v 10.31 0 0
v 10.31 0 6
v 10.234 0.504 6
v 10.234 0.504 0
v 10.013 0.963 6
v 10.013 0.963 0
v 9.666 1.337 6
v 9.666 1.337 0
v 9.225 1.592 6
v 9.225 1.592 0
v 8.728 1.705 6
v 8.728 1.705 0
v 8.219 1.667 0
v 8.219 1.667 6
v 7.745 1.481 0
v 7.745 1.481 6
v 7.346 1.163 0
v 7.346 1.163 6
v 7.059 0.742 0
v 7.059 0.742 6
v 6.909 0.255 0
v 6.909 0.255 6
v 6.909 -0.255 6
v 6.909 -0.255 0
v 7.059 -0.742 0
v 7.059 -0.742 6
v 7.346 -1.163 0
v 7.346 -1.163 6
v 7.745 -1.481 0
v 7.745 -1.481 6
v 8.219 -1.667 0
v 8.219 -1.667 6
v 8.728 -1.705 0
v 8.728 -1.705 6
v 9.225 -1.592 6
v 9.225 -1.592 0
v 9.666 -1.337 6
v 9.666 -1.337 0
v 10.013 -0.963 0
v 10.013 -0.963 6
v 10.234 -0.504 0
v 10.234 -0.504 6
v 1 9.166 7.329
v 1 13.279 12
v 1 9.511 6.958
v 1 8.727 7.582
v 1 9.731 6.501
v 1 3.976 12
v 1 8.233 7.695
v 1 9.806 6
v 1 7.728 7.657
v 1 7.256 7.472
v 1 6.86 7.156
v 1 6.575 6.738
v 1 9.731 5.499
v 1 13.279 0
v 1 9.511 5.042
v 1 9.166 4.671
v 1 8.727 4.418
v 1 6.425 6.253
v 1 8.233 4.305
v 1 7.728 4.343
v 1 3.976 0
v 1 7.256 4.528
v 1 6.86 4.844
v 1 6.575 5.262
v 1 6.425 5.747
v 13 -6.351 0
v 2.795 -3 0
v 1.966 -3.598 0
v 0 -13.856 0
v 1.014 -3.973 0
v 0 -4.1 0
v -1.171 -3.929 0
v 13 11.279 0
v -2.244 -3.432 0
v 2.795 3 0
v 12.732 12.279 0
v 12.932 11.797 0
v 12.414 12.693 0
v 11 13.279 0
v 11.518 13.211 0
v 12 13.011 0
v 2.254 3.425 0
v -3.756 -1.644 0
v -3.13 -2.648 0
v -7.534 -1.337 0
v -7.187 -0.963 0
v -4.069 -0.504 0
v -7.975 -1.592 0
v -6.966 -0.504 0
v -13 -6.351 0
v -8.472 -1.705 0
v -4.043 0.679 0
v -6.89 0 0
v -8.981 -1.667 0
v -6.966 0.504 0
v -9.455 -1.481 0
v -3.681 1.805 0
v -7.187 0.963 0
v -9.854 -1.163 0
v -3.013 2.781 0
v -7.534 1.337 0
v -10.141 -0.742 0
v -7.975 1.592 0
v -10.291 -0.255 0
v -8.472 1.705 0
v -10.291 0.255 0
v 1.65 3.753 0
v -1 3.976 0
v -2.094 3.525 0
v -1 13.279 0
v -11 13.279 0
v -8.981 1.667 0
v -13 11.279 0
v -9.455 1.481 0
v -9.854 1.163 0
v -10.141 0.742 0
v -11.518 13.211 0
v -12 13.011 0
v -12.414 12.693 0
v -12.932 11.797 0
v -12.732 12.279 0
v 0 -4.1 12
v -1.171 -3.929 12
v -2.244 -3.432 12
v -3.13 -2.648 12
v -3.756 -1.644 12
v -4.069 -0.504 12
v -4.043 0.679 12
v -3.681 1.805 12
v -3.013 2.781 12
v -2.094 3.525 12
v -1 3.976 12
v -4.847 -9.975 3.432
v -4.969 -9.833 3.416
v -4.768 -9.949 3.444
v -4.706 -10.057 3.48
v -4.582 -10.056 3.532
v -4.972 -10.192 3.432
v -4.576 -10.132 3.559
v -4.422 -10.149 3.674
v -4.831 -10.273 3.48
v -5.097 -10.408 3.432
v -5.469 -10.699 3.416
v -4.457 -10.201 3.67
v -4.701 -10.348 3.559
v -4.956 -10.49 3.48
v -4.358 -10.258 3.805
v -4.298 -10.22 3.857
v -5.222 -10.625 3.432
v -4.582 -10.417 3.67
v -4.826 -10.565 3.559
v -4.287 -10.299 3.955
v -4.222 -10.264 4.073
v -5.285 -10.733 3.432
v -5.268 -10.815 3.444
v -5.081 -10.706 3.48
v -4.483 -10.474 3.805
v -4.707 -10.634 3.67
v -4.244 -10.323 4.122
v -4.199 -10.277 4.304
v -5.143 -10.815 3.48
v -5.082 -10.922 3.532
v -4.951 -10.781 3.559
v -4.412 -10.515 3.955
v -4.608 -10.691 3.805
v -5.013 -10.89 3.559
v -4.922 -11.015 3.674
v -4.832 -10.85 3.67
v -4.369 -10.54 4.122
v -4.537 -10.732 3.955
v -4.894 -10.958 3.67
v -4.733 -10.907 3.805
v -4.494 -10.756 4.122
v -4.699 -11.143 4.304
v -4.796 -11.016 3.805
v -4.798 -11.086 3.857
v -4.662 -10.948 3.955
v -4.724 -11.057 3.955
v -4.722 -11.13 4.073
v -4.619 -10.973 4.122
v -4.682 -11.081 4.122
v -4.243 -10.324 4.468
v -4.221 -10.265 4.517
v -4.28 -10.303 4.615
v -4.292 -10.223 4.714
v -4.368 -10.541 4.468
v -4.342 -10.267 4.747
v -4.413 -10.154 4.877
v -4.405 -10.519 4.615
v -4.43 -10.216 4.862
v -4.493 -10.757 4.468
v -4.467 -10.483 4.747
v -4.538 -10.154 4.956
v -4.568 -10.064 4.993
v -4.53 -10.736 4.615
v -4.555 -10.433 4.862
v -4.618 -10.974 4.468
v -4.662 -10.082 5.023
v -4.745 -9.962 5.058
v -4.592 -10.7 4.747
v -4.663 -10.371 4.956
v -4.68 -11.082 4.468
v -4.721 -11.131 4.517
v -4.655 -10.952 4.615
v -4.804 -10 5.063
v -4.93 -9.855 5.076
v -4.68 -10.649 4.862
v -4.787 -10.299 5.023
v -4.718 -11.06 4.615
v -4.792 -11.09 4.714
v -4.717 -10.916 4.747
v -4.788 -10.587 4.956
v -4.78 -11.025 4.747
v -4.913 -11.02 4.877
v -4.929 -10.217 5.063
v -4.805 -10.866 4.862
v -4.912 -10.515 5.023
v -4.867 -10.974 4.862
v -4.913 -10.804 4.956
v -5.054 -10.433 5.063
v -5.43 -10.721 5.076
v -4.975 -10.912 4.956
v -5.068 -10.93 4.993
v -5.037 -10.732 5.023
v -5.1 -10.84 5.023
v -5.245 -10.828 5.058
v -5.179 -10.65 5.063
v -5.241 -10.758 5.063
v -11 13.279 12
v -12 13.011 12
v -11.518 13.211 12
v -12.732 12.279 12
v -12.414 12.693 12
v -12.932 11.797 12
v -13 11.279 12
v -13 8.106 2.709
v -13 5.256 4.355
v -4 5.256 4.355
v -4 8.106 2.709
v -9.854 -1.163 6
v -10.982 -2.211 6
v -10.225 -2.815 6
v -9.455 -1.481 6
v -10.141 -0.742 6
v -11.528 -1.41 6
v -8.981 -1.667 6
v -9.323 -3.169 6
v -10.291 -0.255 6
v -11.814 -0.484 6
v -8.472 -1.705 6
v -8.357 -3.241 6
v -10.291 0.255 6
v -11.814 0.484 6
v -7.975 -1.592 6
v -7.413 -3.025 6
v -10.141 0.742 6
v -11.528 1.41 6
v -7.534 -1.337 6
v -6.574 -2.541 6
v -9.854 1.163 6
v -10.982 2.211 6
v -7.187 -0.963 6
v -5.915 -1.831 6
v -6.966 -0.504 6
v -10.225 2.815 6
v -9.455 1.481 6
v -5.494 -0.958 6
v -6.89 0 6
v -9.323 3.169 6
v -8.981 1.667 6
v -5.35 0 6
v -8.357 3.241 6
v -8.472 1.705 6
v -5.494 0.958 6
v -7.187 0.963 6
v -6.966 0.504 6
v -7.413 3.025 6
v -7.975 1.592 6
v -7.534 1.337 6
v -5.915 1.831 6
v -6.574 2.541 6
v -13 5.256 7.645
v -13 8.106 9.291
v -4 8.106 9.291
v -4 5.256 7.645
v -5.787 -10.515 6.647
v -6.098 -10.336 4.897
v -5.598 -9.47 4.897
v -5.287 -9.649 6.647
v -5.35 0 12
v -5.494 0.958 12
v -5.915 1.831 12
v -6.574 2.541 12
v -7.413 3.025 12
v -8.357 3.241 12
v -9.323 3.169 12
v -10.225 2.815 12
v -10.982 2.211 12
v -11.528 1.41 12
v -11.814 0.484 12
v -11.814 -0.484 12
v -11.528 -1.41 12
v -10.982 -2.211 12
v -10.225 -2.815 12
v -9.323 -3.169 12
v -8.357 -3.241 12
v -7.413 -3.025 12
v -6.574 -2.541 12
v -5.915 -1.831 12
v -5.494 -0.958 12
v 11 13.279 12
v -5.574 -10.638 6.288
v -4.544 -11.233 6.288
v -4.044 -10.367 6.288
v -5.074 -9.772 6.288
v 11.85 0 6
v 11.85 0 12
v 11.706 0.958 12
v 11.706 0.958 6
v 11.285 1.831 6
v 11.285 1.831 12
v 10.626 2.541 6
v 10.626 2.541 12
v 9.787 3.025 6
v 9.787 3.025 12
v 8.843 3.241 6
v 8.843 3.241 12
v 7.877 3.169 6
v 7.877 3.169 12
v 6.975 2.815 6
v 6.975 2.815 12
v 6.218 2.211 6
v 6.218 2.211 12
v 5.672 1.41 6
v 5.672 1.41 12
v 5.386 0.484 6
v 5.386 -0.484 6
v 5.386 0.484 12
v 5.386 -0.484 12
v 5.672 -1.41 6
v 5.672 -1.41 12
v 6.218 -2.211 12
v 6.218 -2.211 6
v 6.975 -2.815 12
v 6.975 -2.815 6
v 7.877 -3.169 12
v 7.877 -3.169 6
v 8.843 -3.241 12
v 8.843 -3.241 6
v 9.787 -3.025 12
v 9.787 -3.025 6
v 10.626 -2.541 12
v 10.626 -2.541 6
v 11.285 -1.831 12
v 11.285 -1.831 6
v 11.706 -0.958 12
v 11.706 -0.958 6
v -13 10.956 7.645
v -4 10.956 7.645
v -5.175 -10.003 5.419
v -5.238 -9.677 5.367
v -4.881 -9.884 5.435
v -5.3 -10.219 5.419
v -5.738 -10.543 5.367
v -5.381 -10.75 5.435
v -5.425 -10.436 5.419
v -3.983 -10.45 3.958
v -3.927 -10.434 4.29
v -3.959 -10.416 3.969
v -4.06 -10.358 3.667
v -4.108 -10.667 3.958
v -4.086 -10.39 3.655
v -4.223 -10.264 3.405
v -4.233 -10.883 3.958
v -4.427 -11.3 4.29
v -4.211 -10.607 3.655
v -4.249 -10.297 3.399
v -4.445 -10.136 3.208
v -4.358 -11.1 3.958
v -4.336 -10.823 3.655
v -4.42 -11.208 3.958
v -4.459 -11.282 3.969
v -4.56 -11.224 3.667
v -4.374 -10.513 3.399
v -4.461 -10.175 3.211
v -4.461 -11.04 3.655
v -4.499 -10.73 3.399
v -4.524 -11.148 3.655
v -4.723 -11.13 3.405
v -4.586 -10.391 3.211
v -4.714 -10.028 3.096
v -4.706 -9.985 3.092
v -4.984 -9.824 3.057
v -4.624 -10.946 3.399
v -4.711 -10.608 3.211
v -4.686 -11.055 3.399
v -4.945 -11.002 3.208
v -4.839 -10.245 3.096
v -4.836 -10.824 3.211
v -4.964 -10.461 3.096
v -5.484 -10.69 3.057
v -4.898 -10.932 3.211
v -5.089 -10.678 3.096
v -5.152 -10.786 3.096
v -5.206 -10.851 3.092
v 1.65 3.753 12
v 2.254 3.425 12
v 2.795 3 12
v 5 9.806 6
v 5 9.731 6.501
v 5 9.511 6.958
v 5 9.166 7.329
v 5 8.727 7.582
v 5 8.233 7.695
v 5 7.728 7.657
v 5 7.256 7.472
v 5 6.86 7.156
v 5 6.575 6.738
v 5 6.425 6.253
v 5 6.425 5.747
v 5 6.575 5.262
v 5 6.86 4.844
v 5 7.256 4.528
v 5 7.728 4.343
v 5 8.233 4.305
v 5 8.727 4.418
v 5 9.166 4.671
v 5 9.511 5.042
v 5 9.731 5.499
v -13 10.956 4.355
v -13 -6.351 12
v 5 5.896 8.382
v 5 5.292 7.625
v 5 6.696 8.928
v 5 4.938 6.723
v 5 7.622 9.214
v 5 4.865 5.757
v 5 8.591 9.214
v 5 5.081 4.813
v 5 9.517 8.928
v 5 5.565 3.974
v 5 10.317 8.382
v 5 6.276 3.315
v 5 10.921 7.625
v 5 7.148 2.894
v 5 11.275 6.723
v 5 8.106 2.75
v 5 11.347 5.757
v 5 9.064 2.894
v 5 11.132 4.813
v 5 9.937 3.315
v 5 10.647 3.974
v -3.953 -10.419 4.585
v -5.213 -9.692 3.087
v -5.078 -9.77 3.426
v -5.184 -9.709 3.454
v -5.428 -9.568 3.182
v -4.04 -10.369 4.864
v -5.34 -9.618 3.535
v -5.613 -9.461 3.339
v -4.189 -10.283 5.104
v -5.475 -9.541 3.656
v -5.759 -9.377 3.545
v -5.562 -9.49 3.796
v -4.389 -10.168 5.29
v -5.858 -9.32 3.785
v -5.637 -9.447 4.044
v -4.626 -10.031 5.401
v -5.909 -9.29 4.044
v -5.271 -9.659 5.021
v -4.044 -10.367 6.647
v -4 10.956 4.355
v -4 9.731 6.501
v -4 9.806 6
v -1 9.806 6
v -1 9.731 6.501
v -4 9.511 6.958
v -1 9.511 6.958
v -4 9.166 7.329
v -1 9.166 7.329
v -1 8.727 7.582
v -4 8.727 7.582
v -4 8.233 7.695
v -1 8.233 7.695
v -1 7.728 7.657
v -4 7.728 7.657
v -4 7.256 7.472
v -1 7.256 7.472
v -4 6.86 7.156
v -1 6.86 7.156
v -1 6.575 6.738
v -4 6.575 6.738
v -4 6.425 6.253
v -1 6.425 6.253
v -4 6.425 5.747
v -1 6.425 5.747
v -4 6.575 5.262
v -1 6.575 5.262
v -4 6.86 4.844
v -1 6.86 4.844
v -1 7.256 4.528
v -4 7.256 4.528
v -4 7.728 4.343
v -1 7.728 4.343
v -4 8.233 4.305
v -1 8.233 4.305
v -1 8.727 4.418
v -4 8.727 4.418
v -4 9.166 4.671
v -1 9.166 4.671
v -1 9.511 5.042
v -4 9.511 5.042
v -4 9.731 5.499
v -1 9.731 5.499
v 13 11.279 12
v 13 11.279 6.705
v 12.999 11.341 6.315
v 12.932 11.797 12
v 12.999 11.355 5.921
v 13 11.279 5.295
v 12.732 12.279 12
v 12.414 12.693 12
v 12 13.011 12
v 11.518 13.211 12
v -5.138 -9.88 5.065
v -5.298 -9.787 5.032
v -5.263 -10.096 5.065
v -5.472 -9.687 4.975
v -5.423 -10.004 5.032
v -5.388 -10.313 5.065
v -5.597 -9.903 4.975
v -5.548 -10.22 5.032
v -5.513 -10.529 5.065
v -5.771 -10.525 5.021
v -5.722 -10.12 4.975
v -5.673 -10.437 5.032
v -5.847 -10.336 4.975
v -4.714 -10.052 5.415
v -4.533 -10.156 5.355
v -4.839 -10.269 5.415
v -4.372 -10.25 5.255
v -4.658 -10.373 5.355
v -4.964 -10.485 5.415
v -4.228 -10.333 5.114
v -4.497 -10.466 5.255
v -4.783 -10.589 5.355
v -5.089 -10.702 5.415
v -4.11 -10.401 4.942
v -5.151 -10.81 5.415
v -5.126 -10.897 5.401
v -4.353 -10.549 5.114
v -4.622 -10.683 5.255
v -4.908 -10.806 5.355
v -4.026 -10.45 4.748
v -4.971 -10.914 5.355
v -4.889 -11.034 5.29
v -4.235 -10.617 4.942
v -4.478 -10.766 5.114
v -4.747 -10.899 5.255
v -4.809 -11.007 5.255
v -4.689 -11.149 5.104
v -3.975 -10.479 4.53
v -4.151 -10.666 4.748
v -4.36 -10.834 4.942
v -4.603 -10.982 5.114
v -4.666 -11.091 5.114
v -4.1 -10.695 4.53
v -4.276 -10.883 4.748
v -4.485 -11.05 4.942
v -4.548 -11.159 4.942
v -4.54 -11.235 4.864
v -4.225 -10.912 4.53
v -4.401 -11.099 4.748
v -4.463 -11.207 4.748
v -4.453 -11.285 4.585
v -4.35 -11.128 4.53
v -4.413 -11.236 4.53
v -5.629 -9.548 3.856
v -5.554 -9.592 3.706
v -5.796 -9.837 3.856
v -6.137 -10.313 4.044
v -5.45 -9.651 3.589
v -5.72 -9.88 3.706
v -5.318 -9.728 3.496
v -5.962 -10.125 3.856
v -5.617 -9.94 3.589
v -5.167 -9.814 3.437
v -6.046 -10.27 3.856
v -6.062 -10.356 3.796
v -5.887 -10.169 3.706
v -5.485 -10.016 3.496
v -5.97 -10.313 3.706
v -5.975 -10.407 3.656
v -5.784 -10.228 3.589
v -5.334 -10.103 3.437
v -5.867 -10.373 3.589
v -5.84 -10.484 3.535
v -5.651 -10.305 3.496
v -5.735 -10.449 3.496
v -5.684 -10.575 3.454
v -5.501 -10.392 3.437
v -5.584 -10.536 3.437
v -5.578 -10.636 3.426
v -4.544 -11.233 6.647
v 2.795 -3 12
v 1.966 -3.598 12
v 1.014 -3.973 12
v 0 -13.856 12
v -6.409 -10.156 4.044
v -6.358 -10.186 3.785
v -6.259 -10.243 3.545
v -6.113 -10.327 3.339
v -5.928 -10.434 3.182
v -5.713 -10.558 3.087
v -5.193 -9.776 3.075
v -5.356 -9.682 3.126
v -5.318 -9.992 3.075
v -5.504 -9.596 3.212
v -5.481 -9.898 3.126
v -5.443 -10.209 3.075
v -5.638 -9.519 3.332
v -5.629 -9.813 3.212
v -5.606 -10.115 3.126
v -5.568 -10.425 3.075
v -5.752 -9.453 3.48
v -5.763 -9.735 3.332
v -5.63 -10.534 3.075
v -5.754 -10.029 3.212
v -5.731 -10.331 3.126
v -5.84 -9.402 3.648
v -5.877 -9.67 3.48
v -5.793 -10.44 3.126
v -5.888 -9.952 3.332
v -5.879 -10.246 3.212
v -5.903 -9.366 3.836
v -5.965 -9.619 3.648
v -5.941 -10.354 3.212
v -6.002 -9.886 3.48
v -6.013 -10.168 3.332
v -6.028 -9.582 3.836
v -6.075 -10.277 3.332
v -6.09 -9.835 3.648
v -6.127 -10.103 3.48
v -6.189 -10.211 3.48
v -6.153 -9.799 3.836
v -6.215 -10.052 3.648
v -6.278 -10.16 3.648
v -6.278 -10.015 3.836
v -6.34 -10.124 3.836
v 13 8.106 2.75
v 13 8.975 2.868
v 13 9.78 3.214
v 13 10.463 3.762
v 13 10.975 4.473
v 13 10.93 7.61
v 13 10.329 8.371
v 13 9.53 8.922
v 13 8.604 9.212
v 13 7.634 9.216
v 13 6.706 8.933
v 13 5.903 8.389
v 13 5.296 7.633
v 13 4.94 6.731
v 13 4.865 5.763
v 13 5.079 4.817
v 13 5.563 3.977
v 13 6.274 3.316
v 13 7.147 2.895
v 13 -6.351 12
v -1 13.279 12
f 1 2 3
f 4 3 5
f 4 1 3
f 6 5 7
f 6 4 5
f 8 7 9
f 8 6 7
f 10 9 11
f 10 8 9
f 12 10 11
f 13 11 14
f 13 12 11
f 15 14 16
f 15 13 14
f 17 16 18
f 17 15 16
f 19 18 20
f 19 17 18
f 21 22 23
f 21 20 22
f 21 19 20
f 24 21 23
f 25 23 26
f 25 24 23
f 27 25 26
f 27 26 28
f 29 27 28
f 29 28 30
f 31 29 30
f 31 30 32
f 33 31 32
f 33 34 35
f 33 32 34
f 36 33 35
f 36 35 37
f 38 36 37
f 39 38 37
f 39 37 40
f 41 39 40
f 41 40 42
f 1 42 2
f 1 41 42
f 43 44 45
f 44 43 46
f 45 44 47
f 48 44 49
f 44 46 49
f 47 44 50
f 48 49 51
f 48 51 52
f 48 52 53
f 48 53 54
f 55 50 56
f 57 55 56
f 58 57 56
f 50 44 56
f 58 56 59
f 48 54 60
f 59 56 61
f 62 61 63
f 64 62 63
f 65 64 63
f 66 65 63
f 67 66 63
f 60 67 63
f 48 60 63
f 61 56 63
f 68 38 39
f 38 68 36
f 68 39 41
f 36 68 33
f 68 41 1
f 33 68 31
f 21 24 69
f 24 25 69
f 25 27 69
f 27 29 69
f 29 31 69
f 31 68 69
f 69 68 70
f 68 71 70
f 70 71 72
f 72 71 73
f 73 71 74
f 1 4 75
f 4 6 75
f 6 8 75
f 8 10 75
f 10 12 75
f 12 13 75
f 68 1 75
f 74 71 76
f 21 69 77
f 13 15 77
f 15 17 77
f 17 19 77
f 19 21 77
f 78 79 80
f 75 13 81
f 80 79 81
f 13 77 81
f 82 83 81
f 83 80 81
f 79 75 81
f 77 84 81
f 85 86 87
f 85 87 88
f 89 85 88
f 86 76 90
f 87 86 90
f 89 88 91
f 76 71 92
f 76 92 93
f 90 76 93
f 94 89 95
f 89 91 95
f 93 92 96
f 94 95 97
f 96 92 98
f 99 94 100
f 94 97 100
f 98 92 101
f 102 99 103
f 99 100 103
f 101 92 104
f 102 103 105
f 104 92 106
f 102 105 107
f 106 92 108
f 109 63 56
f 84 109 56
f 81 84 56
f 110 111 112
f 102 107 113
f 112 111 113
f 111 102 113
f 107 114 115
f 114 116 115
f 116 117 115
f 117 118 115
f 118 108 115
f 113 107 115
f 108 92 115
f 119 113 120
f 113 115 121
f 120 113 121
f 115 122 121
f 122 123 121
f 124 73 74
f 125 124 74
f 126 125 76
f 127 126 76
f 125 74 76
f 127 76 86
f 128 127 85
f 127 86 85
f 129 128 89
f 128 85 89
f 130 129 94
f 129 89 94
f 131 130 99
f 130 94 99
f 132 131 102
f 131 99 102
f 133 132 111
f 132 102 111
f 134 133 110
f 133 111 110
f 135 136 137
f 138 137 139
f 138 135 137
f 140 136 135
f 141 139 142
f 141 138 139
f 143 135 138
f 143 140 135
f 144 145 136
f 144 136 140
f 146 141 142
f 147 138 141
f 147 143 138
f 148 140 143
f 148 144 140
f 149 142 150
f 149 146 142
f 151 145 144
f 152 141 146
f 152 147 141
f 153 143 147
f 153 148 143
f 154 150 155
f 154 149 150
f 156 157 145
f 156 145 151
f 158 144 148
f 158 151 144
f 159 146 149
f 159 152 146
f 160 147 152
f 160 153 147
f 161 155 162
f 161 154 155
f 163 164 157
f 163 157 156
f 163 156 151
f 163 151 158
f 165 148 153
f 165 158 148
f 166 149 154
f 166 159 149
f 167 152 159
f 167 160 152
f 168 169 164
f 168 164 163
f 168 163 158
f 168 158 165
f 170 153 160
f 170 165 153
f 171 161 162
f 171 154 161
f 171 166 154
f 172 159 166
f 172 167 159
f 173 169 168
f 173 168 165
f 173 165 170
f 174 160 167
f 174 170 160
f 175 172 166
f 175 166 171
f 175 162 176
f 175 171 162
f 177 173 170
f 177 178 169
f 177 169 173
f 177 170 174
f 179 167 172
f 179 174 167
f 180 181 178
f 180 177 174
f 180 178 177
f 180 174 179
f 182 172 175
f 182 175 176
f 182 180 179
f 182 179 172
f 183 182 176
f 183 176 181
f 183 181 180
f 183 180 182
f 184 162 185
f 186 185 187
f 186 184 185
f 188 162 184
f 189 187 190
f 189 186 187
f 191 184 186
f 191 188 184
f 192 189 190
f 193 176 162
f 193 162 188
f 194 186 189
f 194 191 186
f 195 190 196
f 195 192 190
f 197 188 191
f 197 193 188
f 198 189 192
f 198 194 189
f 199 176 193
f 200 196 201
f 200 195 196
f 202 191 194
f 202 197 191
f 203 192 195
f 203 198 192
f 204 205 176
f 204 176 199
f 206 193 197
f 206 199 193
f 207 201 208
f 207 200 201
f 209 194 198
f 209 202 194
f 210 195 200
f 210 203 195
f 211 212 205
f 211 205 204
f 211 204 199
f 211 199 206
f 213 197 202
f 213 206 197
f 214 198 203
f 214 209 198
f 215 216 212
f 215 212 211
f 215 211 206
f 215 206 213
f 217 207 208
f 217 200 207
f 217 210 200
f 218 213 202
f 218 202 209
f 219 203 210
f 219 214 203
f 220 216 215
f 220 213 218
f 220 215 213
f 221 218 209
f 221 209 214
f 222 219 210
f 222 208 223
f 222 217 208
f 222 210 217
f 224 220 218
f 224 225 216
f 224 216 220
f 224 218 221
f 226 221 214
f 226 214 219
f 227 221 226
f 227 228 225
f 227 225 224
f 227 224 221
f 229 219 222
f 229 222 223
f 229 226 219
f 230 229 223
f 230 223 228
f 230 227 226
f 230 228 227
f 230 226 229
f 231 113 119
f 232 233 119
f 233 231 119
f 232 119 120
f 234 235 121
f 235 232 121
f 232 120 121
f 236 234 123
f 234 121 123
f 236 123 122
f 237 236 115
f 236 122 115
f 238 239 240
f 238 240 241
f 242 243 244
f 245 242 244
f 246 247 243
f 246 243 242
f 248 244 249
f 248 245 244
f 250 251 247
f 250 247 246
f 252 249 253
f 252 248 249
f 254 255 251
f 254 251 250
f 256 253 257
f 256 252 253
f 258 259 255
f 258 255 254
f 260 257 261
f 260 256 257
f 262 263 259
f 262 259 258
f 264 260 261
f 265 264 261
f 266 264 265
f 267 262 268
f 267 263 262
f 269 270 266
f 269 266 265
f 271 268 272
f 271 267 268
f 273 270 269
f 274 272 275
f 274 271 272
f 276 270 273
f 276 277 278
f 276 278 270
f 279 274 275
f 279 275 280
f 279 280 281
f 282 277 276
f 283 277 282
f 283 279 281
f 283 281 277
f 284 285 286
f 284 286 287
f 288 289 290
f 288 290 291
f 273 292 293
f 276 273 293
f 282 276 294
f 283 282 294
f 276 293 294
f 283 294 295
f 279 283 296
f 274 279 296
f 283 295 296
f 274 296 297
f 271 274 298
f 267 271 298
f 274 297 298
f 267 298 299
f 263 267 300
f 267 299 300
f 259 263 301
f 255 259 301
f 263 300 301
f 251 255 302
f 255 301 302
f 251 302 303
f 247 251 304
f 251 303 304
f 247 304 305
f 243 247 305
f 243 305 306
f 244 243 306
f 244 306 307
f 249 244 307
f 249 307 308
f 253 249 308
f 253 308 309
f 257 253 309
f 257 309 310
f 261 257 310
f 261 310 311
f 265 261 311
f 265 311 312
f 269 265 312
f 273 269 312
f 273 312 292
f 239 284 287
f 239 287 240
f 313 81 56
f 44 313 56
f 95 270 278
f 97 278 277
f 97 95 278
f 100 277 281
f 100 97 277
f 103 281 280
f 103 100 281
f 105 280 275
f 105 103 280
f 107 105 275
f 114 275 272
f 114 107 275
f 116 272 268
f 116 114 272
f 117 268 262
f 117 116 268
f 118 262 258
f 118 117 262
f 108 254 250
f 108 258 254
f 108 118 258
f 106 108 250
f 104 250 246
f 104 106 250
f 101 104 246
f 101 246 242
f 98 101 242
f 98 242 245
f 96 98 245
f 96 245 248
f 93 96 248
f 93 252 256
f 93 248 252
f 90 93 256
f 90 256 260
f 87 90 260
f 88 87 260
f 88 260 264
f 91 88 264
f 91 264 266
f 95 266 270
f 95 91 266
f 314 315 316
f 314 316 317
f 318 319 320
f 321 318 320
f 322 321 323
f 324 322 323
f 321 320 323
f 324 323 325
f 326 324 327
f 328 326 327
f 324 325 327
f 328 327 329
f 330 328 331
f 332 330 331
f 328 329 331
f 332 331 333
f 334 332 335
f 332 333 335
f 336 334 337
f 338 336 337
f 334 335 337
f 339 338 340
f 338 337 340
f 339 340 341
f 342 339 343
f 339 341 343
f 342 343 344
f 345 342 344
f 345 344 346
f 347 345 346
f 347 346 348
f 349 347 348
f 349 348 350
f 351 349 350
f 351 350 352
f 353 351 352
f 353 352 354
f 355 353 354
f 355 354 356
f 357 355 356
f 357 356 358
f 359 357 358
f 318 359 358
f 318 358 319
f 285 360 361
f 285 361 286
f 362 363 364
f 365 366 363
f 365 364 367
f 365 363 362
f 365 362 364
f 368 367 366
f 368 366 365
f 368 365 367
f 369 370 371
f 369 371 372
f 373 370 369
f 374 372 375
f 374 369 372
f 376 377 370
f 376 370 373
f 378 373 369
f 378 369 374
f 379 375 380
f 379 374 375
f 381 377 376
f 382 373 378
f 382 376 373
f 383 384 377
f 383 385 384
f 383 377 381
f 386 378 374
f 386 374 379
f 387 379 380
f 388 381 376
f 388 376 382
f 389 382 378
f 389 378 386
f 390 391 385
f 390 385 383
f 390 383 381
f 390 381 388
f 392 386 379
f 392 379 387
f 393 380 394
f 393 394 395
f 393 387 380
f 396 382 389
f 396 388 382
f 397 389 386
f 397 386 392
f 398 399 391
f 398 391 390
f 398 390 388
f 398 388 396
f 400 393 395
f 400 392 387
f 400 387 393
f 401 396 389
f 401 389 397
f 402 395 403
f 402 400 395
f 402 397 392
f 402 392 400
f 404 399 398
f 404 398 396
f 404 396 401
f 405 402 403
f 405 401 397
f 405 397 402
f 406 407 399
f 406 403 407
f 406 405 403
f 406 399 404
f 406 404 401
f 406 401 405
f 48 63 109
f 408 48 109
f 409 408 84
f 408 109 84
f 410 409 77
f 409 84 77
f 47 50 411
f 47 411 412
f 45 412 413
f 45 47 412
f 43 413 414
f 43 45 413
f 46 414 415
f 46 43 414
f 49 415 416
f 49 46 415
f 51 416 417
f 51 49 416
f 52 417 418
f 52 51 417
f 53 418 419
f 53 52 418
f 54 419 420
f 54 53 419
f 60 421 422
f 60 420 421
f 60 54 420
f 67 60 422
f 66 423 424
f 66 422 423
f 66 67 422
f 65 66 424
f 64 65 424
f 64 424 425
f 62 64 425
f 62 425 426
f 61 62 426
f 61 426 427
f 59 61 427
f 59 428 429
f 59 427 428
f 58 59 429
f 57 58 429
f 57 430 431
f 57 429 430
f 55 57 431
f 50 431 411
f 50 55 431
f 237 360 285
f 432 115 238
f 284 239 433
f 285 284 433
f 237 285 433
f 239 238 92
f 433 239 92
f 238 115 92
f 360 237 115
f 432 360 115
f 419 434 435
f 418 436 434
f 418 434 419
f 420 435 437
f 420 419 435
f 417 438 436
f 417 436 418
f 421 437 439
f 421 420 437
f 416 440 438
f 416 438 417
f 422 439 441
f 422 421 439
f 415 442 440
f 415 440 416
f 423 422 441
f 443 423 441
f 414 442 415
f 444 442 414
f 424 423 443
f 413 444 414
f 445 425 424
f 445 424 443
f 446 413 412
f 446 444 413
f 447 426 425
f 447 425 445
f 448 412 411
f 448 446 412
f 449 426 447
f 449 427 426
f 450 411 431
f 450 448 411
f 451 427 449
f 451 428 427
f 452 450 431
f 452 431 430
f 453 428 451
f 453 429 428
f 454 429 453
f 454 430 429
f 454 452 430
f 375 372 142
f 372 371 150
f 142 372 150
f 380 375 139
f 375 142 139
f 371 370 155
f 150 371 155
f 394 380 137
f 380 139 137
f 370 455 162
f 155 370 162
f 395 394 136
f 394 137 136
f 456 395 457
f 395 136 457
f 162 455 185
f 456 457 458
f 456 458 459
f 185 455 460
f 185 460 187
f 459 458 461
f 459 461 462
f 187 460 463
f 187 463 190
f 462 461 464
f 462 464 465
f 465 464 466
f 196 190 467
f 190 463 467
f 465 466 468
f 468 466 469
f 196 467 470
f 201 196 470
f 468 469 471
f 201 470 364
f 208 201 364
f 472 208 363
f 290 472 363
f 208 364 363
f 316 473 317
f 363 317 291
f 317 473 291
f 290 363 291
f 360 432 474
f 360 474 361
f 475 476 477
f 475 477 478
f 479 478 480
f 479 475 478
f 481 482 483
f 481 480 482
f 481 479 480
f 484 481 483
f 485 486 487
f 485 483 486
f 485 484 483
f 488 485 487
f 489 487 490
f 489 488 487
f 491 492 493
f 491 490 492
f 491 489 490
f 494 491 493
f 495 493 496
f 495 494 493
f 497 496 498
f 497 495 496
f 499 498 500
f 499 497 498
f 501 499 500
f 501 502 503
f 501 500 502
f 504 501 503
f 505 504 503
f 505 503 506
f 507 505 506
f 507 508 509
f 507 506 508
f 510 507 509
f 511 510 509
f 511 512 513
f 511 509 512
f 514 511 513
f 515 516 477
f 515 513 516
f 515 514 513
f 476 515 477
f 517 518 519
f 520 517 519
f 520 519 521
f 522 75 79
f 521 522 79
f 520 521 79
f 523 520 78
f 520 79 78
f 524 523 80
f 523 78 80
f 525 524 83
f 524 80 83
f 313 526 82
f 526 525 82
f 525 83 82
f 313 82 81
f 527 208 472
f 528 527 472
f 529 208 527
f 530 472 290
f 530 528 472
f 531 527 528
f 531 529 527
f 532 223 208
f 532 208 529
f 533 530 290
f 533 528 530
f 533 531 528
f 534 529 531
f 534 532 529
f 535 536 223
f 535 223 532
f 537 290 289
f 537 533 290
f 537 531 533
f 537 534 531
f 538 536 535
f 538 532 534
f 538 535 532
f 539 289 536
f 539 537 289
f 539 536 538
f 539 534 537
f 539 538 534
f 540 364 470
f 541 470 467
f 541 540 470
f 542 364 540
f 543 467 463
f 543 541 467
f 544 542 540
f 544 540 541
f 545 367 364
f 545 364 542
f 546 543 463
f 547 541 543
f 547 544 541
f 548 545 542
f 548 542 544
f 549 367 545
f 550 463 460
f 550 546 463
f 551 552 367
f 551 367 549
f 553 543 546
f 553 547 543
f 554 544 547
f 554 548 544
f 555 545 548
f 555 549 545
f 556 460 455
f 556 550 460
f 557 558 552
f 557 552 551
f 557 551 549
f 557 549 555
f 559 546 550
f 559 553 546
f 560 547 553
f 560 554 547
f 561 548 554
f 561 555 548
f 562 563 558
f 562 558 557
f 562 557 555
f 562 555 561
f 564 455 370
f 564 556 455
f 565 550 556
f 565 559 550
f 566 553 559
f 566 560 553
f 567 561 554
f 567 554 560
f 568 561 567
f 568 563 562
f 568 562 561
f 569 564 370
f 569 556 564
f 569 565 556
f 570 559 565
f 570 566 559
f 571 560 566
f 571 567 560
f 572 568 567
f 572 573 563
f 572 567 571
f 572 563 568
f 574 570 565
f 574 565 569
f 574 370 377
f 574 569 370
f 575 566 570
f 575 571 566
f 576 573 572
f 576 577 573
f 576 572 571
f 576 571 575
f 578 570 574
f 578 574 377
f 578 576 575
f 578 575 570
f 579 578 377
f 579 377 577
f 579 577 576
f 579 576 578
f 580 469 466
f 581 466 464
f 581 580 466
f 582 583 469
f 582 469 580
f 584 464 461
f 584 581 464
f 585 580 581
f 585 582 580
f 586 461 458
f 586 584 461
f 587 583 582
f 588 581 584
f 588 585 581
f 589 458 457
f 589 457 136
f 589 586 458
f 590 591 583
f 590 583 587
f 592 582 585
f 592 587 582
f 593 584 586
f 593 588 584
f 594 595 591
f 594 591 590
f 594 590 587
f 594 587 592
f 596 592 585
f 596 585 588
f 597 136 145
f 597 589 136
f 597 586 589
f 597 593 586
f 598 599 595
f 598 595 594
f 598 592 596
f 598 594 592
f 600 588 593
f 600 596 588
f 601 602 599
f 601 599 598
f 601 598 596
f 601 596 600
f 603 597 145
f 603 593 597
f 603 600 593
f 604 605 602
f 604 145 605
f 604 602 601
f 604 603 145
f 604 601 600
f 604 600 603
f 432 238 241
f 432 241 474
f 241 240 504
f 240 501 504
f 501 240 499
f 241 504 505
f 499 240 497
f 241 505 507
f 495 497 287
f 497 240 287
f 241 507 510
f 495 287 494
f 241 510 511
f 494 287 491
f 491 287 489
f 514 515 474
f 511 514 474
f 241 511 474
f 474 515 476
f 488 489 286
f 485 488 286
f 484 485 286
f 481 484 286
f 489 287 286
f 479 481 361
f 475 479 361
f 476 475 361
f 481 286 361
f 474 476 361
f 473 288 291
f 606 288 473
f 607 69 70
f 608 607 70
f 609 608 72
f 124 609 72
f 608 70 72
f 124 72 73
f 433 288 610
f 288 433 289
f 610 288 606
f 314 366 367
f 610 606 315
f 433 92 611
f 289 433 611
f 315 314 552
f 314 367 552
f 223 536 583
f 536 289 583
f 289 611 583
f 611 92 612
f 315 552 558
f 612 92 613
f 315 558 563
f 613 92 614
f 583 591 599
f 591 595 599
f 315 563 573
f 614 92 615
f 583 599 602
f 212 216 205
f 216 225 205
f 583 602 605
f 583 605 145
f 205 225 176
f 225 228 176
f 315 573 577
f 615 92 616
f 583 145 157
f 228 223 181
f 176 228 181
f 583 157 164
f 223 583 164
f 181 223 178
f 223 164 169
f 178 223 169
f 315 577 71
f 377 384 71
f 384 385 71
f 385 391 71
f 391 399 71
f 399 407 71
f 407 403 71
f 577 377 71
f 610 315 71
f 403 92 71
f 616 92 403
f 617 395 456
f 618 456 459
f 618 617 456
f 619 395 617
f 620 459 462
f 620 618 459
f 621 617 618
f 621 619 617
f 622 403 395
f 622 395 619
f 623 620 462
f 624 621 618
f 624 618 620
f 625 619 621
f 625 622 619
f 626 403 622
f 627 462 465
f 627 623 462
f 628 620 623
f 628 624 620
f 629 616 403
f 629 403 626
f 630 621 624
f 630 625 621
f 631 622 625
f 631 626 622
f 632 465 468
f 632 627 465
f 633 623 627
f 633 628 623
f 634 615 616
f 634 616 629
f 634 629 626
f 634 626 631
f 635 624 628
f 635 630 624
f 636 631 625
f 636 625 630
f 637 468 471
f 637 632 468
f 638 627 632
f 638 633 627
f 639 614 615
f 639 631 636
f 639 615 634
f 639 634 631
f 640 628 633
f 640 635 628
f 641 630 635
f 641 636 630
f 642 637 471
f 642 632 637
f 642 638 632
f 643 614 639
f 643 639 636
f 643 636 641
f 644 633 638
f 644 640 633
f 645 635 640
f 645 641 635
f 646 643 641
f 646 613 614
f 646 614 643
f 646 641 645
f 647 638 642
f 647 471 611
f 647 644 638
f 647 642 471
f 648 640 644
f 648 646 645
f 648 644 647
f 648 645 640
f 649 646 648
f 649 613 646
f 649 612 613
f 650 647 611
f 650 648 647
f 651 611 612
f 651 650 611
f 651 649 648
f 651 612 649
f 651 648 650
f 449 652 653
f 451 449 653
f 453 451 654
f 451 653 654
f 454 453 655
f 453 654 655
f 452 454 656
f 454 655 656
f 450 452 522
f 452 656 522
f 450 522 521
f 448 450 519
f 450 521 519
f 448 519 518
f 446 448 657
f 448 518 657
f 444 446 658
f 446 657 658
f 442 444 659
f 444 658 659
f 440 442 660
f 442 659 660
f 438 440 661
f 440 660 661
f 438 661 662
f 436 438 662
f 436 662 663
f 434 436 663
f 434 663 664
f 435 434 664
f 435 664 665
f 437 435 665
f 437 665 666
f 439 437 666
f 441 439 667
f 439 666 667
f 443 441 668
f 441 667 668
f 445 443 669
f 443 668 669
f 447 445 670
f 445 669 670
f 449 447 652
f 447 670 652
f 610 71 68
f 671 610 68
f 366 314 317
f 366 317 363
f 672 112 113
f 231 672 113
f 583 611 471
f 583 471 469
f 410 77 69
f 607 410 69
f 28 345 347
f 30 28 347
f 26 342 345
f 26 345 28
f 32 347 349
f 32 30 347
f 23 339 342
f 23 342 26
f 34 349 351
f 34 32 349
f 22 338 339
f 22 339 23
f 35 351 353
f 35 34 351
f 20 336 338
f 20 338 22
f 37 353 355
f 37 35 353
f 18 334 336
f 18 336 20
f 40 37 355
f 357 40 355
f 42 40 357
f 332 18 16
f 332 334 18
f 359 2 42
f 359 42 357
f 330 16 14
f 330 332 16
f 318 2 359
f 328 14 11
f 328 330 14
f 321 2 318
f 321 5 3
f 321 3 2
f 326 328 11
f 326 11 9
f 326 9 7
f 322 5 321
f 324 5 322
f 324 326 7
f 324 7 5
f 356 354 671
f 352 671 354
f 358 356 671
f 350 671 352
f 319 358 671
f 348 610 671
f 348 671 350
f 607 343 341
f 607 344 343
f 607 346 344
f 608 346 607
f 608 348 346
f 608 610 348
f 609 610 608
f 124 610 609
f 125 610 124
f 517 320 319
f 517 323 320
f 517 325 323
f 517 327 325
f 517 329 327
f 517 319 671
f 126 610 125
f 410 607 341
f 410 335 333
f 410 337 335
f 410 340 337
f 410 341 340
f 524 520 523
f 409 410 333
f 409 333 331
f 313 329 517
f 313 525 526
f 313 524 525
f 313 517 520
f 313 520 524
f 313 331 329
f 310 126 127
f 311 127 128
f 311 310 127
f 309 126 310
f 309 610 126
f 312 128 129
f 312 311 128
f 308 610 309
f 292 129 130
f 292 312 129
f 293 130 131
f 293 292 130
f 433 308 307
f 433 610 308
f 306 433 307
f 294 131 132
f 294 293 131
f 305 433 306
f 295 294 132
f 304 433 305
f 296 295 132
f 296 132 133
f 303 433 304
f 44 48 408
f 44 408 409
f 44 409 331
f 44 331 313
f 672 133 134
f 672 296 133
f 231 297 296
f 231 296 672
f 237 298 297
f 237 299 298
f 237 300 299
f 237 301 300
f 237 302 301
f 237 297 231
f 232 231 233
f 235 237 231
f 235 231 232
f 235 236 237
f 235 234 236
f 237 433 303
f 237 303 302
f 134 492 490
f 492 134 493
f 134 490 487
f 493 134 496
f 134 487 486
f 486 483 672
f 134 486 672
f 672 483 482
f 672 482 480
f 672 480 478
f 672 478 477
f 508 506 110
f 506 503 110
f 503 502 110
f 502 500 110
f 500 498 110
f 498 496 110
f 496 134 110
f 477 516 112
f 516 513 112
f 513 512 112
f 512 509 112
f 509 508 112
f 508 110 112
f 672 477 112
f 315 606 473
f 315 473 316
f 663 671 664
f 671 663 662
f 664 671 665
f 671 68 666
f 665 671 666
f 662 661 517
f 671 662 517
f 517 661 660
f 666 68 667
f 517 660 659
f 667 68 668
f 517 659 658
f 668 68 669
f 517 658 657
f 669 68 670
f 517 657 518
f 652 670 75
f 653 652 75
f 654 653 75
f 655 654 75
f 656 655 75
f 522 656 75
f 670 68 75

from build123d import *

# Parameters (mm, degrees)
BOSS_EXTRUDE1_DEPTH            = 12
SKETCH41_R                     = 1.71
CUT_EXTRUDE7_DEPTH             = 18
CBORE_FOR_M3_SHCS1_D           = 3.4
CBORE_FOR_M3_SHCS1_CBORE_D     = 6.5
CBORE_FOR_M3_SHCS1_CBORE_DEPTH = 3
CBORE_FOR_M3_SHCS2_D           = 3.4
CBORE_FOR_M3_SHCS2_CBORE_D     = 6.5
CBORE_FOR_M3_SHCS2_CBORE_DEPTH = 3
CUT_EXTRUDE10_DEPTH            = 15
CUT_EXTRUDE10_DEPTH_BACK       = 15
SKETCH52_R                     = 1.7
SKETCH58_R                     = 3.25
CUT_EXTRUDE11_DEPTH            = 8
CUT_EXTRUDE12_DEPTH            = 4
CUT_EXTRUDE12_DEPTH_BACK       = 6
FILLET1_R                      = 2
SKETCH61_R                     = 3.25
CUT_EXTRUDE13_DEPTH            = 6
CUT_EXTRUDE14_DEPTH            = 1


with BuildPart() as part:
    # Sketch1 → Boss-Extrude1 (new body)
    with BuildSketch(Plane(origin=(0, 0, 0), x_dir=(0, 1, 0), z_dir=(0, 0, 1))):
        with BuildLine():
            Line((-6.350852961, -13), (13.279056191, -13))
            Line((13.279056191, -13), (13.279056191, -1))
            Line((13.279056191, -1), (3.97617907, -1))
            ThreePointArc((3.97617907, -1), (3.601659304, -1.959094244), (3, -2.794637722))
            Line((3, -2.794637722), (-3, -2.794637722))
            ThreePointArc((-3, -2.794637722), (-3.815101571, -1.501665742), (-4.1, 0))
            ThreePointArc((-4.1, 0), (-0.503818326, 4.06892702), (3.97617907, 1))
            Line((3.97617907, 1), (13.279056191, 1))
            Line((13.279056191, 1), (13.279056191, 13))
            Line((13.279056191, 13), (-6.350852961, 13))
            Line((-6.350852961, 13), (-13.856406461, 0))
            Line((-13.856406461, 0), (-6.350852961, -13))
        make_face()
    extrude(amount=BOSS_EXTRUDE1_DEPTH)

    # Sketch41 → Cut-Extrude7 (cut)
    with BuildSketch(Plane(origin=(0, 0, 0), x_dir=(0, 1, 0), z_dir=(0, 0, 1))):
        with Locations(Location((0, 8.6, 0), (0, 0, 270))):
            Circle(SKETCH41_R)
        with Locations(Location((0, -8.6, 0), (0, 0, 270))):
            Circle(SKETCH41_R)
    extrude(amount=CUT_EXTRUDE7_DEPTH, mode=Mode.SUBTRACT)

    # CBORE for M3 SHCS1 (through all)
    with Locations(Plane(origin=(-8.6, 0, 12), x_dir=(1, 0, 0), z_dir=(0, 0, 1))):
        with Locations((0, 0)):
            CounterBoreHole(CBORE_FOR_M3_SHCS1_D / 2, CBORE_FOR_M3_SHCS1_CBORE_D / 2, CBORE_FOR_M3_SHCS1_CBORE_DEPTH)

    # CBORE for M3 SHCS2 (through all)
    with Locations(Plane(origin=(8.6, 0, 12), x_dir=(1, 0, 0), z_dir=(0, 0, 1))):
        with Locations((0, 0)):
            CounterBoreHole(CBORE_FOR_M3_SHCS2_D / 2, CBORE_FOR_M3_SHCS2_CBORE_D / 2, CBORE_FOR_M3_SHCS2_CBORE_DEPTH)

    # Sketch52 → Cut-Extrude10 (cut, two sides: drawn at the far end of the back side and taken through both)
    with BuildSketch(Plane.YZ.offset(-1).offset(-CUT_EXTRUDE10_DEPTH_BACK)):
        with Locations((8.106406461, 6)):
            Circle(SKETCH52_R)
    extrude(amount=CUT_EXTRUDE10_DEPTH + CUT_EXTRUDE10_DEPTH_BACK, mode=Mode.SUBTRACT)

    # Sketch58 → Cut-Extrude11 (cut)
    with BuildSketch(Plane.YZ.offset(13)):
        with Locations(Location((8.106406461, 6, 0), (0, 0, 270))):
            Circle(SKETCH58_R)
    extrude(amount=-CUT_EXTRUDE11_DEPTH, mode=Mode.SUBTRACT)

    # Sketch60 → Cut-Extrude12 (cut, two sides: drawn at the far end of the back side and taken through both)
    with BuildSketch(Plane.YZ.offset(-8).offset(-CUT_EXTRUDE12_DEPTH_BACK)):
        Polygon((8.106406461, 2.709103466), (10.956406461, 4.354551733), (10.956406461, 7.645448267), (8.106406461, 9.290896534), (5.256406461, 7.645448267), (5.256406461, 4.354551733), align=None)
    extrude(amount=CUT_EXTRUDE12_DEPTH + CUT_EXTRUDE12_DEPTH_BACK, mode=Mode.SUBTRACT)

    # Fillet1
    # the kernel refuses this fillet: 2 mm, written as the material it takes off along each edge
    with BuildSketch(Plane(origin=(13, 13.279056191, -5), x_dir=(0, -1, 0), z_dir=(0, 0, 1))) as fillet1_piece_1:
        with BuildLine():
            CenterArc((FILLET1_R, -FILLET1_R), FILLET1_R, 90, 90)
            Line((0, -FILLET1_R), (0, 0))
            Line((0, 0), (FILLET1_R, 0))
        make_face()
    extrude(amount=22, mode=Mode.SUBTRACT)
    with BuildSketch(Plane(origin=(-13, 13.279056191, -5), x_dir=(0, -1, 0), z_dir=(0, 0, 1))) as fillet1_piece_2:
        with BuildLine():
            CenterArc((FILLET1_R, FILLET1_R), FILLET1_R, 180, 90)
            Line((0, FILLET1_R), (0, 0))
            Line((0, 0), (FILLET1_R, 0))
        make_face()
    extrude(amount=22, mode=Mode.SUBTRACT)

    # Sketch61 → Cut-Extrude13 (cut)
    with BuildSketch(Plane(origin=(0, 0, 12), x_dir=(0, 1, 0), z_dir=(0, 0, 1))):
        with Locations(Location((0, 8.6, 0), (0, 0, 270))):
            Circle(SKETCH61_R)
        with Locations(Location((0, -8.6, 0), (0, 0, 270))):
            Circle(SKETCH61_R)
    extrude(amount=-CUT_EXTRUDE13_DEPTH, mode=Mode.SUBTRACT)

    # Sketch62 → Cut-Extrude14 (cut)
    with BuildSketch(Plane(origin=(-6, -10.392304845, 0), x_dir=(0.8660254037844386, -0.5000000000000001, 0), z_dir=(-0.5000000000000001, -0.8660254037844386, 0))):
        with BuildLine():
            Line((1.681473513, 6.646959362), (1.681473513, 6.287985003))
            Line((1.681473513, 6.287985003), (0.491669827, 6.287985003))
            Line((0.491669827, 6.287985003), (0.302366943, 5.367412086))
            add(Edge.make_bspline(
                [(0.302366943, 5.367412086), (0.339422817, 5.377642358), (0.411212713, 5.397461892), (0.517172574, 5.419467662), (0.617764777, 5.432733106), (0.683040148, 5.434544417), (0.714626558, 5.435420901)],
                knots=[0, 0, 0, 0, 1.100273476, 2.13160584, 3.095893838, 4, 4, 4, 4], degree=3))
            add(Edge.make_bspline(
                [(0.714626558, 5.435420901), (0.753710298, 5.434574965), (0.830558695, 5.432911644), (0.942997642, 5.416939795), (1.050330535, 5.39179988), (1.152332906, 5.356679358), (1.249193456, 5.311769625), (1.340021018, 5.255669685), (1.426178931, 5.190136353), (1.506121525, 5.114791341), (1.578645833, 5.031869725), (1.642411822, 4.942711854), (1.696574413, 4.848184192), (1.740135168, 4.747383583), (1.774919502, 4.641424429), (1.798071497, 4.529191847), (1.813488206, 4.411743727), (1.815210592, 4.331439157), (1.816088898, 4.29048901)],
                knots=[0, 0, 0, 0, 1.052922333, 2.070308379, 3.05430497, 4.020497103, 4.973039431, 5.925935799, 6.892292201, 7.88610001, 8.88166317, 9.857072816, 10.836096531, 11.812156883, 12.81219415, 13.836441305, 14.89672472, 16, 16, 16, 16], degree=3))
            add(Edge.make_bspline(
                [(1.816088898, 4.29048901), (1.815423823, 4.261966789), (1.81410266, 4.205307802), (1.807384072, 4.121163601), (1.794448356, 4.038800768), (1.777080632, 3.958208376), (1.754538214, 3.879539004), (1.72724916, 3.802567476), (1.693853133, 3.727772869), (1.657221758, 3.654447474), (1.61597528, 3.584248967), (1.570196772, 3.51859998), (1.521831281, 3.456515699), (1.469789896, 3.398661966), (1.4135889, 3.345418948), (1.353908934, 3.296470667), (1.291226215, 3.250989336), (1.224570972, 3.210821141), (1.155428489, 3.173858185), (1.082800272, 3.143534648), (1.008339572, 3.116424119), (0.930974696, 3.094814592), (0.850880883, 3.077882037), (0.767926108, 3.066381437), (0.682545438, 3.058004999), (0.624670425, 3.057480642), (0.595435853, 3.057215772)],
                knots=[0, 0, 0, 0, 1.056347294, 2.098418968, 3.122841568, 4.141288669, 5.149314143, 6.15115421, 7.162517403, 8.180376062, 9.185164535, 10.17417709, 11.141909838, 12.097768115, 13.052685741, 14.0056014, 14.954263652, 15.917497458, 16.885230207, 17.854509472, 18.828990115, 19.81800267, 20.826176721, 21.857883937, 22.917946725, 24, 24, 24, 24], degree=3))
            add(Edge.make_bspline(
                [(0.595435853, 3.057215772), (0.560561672, 3.05790661), (0.491950842, 3.059265752), (0.391430275, 3.073484238), (0.294715669, 3.093848154), (0.202585568, 3.124484424), (0.114214304, 3.162871719), (0.030791586, 3.21138789), (-0.04981419, 3.266366994), (-0.124326227, 3.331247347), (-0.19348234, 3.402163029), (-0.255388849, 3.47912067), (-0.310522426, 3.560850112), (-0.358000173, 3.647748266), (-0.398498194, 3.739586797), (-0.430313182, 3.836709798), (-0.455991537, 3.938609802), (-0.466854958, 4.008763312), (-0.472372641, 4.04439526)],
                knots=[0, 0, 0, 0, 1.0467383, 2.05933395, 3.04377827, 4.011590433, 4.970194871, 5.932262533, 6.905835911, 7.896367577, 8.894135286, 9.877477877, 10.858688626, 11.851381753, 12.8477658, 13.868841284, 14.917554742, 16, 16, 16, 16], degree=3))
            Line((-0.472372641, 4.04439526), (-0.158270076, 4.04439526))
            add(Edge.make_bspline(
                [(-0.158270076, 4.04439526), (-0.150541519, 4.011018807), (-0.135686803, 3.946867412), (-0.103081054, 3.856736071), (-0.063215178, 3.776416847), (-0.01581083, 3.704847264), (0.040739201, 3.642438267), (0.105268629, 3.586821205), (0.177616353, 3.536646075), (0.258009582, 3.494823308), (0.342822662, 3.459154555), (0.431589872, 3.43540286), (0.521894218, 3.418701967), (0.582972588, 3.417030206), (0.61366502, 3.416190131)],
                knots=[0, 0, 0, 0, 1.136247022, 2.183929868, 3.172523383, 4.106158343, 5.02341133, 5.958108904, 6.928429099, 7.938127109, 8.96079061, 9.975095812, 10.982467395, 12, 12, 12, 12], degree=3))
            add(Edge.make_bspline(
                [(0.61366502, 3.416190131), (0.643623464, 3.417010909), (0.702611886, 3.418627028), (0.789423273, 3.43106604), (0.873236147, 3.450223611), (0.953223504, 3.478893466), (1.030785044, 3.513738184), (1.103958814, 3.55845326), (1.174861691, 3.609913279), (1.241289825, 3.668869909), (1.302129274, 3.733839603), (1.355885395, 3.803316997), (1.400662308, 3.877433843), (1.438396417, 3.954906996), (1.467049716, 4.036585553), (1.487490697, 4.122086729), (1.499493756, 4.211621709), (1.501144936, 4.272691019), (1.501986334, 4.303810324)],
                knots=[0, 0, 0, 0, 1.027316725, 2.022795036, 3.002884548, 3.971462791, 4.93288096, 5.914575861, 6.907176829, 7.935150275, 8.956128384, 9.956726525, 10.942570165, 11.921478529, 12.907843606, 13.90538589, 14.932640048, 16, 16, 16, 16], degree=3))
            add(Edge.make_bspline(
                [(1.501986334, 4.303810324), (1.501327854, 4.331886075), (1.500038975, 4.386840364), (1.489508404, 4.467239571), (1.471191432, 4.543312613), (1.445767552, 4.615426847), (1.413488044, 4.683650289), (1.374041732, 4.74805335), (1.326688334, 4.807787183), (1.272596445, 4.862879736), (1.213338404, 4.913724611), (1.147894662, 4.957068698), (1.077634735, 4.993532615), (1.003405136, 5.025000614), (0.923440237, 5.047601359), (0.839323605, 5.064569245), (0.750146897, 5.074384607), (0.689176208, 5.075746496), (0.657835693, 5.076446542)],
                knots=[0, 0, 0, 0, 1.045622112, 2.046656509, 3.013763289, 3.955457236, 4.890082067, 5.820317437, 6.762574623, 7.722996705, 8.69280354, 9.665887285, 10.63943826, 11.638615906, 12.663482002, 13.728887084, 14.832589034, 16, 16, 16, 16], degree=3))
            add(Edge.make_bspline(
                [(0.657835693, 5.076446542), (0.630706764, 5.07586595), (0.574692409, 5.074667177), (0.488769582, 5.06584068), (0.398477859, 5.051601386), (0.304163363, 5.032015138), (0.205542855, 5.006384062), (0.102824455, 4.975669561), (-0.004207812, 4.938947562), (-0.076325536, 4.911215348), (-0.113398282, 4.896959362)],
                knots=[0, 0, 0, 0, 0.817624296, 1.688186739, 2.600797293, 3.572016777, 4.590301741, 5.671205678, 6.80286297, 8, 8, 8, 8], degree=3))
            Line((-0.113398282, 4.896959362), (0.245576077, 6.646959362))
            Line((0.245576077, 6.646959362), (1.681473513, 6.646959362))
        make_face()
    extrude(amount=-CUT_EXTRUDE14_DEPTH, mode=Mode.SUBTRACT)


solid = part.part
